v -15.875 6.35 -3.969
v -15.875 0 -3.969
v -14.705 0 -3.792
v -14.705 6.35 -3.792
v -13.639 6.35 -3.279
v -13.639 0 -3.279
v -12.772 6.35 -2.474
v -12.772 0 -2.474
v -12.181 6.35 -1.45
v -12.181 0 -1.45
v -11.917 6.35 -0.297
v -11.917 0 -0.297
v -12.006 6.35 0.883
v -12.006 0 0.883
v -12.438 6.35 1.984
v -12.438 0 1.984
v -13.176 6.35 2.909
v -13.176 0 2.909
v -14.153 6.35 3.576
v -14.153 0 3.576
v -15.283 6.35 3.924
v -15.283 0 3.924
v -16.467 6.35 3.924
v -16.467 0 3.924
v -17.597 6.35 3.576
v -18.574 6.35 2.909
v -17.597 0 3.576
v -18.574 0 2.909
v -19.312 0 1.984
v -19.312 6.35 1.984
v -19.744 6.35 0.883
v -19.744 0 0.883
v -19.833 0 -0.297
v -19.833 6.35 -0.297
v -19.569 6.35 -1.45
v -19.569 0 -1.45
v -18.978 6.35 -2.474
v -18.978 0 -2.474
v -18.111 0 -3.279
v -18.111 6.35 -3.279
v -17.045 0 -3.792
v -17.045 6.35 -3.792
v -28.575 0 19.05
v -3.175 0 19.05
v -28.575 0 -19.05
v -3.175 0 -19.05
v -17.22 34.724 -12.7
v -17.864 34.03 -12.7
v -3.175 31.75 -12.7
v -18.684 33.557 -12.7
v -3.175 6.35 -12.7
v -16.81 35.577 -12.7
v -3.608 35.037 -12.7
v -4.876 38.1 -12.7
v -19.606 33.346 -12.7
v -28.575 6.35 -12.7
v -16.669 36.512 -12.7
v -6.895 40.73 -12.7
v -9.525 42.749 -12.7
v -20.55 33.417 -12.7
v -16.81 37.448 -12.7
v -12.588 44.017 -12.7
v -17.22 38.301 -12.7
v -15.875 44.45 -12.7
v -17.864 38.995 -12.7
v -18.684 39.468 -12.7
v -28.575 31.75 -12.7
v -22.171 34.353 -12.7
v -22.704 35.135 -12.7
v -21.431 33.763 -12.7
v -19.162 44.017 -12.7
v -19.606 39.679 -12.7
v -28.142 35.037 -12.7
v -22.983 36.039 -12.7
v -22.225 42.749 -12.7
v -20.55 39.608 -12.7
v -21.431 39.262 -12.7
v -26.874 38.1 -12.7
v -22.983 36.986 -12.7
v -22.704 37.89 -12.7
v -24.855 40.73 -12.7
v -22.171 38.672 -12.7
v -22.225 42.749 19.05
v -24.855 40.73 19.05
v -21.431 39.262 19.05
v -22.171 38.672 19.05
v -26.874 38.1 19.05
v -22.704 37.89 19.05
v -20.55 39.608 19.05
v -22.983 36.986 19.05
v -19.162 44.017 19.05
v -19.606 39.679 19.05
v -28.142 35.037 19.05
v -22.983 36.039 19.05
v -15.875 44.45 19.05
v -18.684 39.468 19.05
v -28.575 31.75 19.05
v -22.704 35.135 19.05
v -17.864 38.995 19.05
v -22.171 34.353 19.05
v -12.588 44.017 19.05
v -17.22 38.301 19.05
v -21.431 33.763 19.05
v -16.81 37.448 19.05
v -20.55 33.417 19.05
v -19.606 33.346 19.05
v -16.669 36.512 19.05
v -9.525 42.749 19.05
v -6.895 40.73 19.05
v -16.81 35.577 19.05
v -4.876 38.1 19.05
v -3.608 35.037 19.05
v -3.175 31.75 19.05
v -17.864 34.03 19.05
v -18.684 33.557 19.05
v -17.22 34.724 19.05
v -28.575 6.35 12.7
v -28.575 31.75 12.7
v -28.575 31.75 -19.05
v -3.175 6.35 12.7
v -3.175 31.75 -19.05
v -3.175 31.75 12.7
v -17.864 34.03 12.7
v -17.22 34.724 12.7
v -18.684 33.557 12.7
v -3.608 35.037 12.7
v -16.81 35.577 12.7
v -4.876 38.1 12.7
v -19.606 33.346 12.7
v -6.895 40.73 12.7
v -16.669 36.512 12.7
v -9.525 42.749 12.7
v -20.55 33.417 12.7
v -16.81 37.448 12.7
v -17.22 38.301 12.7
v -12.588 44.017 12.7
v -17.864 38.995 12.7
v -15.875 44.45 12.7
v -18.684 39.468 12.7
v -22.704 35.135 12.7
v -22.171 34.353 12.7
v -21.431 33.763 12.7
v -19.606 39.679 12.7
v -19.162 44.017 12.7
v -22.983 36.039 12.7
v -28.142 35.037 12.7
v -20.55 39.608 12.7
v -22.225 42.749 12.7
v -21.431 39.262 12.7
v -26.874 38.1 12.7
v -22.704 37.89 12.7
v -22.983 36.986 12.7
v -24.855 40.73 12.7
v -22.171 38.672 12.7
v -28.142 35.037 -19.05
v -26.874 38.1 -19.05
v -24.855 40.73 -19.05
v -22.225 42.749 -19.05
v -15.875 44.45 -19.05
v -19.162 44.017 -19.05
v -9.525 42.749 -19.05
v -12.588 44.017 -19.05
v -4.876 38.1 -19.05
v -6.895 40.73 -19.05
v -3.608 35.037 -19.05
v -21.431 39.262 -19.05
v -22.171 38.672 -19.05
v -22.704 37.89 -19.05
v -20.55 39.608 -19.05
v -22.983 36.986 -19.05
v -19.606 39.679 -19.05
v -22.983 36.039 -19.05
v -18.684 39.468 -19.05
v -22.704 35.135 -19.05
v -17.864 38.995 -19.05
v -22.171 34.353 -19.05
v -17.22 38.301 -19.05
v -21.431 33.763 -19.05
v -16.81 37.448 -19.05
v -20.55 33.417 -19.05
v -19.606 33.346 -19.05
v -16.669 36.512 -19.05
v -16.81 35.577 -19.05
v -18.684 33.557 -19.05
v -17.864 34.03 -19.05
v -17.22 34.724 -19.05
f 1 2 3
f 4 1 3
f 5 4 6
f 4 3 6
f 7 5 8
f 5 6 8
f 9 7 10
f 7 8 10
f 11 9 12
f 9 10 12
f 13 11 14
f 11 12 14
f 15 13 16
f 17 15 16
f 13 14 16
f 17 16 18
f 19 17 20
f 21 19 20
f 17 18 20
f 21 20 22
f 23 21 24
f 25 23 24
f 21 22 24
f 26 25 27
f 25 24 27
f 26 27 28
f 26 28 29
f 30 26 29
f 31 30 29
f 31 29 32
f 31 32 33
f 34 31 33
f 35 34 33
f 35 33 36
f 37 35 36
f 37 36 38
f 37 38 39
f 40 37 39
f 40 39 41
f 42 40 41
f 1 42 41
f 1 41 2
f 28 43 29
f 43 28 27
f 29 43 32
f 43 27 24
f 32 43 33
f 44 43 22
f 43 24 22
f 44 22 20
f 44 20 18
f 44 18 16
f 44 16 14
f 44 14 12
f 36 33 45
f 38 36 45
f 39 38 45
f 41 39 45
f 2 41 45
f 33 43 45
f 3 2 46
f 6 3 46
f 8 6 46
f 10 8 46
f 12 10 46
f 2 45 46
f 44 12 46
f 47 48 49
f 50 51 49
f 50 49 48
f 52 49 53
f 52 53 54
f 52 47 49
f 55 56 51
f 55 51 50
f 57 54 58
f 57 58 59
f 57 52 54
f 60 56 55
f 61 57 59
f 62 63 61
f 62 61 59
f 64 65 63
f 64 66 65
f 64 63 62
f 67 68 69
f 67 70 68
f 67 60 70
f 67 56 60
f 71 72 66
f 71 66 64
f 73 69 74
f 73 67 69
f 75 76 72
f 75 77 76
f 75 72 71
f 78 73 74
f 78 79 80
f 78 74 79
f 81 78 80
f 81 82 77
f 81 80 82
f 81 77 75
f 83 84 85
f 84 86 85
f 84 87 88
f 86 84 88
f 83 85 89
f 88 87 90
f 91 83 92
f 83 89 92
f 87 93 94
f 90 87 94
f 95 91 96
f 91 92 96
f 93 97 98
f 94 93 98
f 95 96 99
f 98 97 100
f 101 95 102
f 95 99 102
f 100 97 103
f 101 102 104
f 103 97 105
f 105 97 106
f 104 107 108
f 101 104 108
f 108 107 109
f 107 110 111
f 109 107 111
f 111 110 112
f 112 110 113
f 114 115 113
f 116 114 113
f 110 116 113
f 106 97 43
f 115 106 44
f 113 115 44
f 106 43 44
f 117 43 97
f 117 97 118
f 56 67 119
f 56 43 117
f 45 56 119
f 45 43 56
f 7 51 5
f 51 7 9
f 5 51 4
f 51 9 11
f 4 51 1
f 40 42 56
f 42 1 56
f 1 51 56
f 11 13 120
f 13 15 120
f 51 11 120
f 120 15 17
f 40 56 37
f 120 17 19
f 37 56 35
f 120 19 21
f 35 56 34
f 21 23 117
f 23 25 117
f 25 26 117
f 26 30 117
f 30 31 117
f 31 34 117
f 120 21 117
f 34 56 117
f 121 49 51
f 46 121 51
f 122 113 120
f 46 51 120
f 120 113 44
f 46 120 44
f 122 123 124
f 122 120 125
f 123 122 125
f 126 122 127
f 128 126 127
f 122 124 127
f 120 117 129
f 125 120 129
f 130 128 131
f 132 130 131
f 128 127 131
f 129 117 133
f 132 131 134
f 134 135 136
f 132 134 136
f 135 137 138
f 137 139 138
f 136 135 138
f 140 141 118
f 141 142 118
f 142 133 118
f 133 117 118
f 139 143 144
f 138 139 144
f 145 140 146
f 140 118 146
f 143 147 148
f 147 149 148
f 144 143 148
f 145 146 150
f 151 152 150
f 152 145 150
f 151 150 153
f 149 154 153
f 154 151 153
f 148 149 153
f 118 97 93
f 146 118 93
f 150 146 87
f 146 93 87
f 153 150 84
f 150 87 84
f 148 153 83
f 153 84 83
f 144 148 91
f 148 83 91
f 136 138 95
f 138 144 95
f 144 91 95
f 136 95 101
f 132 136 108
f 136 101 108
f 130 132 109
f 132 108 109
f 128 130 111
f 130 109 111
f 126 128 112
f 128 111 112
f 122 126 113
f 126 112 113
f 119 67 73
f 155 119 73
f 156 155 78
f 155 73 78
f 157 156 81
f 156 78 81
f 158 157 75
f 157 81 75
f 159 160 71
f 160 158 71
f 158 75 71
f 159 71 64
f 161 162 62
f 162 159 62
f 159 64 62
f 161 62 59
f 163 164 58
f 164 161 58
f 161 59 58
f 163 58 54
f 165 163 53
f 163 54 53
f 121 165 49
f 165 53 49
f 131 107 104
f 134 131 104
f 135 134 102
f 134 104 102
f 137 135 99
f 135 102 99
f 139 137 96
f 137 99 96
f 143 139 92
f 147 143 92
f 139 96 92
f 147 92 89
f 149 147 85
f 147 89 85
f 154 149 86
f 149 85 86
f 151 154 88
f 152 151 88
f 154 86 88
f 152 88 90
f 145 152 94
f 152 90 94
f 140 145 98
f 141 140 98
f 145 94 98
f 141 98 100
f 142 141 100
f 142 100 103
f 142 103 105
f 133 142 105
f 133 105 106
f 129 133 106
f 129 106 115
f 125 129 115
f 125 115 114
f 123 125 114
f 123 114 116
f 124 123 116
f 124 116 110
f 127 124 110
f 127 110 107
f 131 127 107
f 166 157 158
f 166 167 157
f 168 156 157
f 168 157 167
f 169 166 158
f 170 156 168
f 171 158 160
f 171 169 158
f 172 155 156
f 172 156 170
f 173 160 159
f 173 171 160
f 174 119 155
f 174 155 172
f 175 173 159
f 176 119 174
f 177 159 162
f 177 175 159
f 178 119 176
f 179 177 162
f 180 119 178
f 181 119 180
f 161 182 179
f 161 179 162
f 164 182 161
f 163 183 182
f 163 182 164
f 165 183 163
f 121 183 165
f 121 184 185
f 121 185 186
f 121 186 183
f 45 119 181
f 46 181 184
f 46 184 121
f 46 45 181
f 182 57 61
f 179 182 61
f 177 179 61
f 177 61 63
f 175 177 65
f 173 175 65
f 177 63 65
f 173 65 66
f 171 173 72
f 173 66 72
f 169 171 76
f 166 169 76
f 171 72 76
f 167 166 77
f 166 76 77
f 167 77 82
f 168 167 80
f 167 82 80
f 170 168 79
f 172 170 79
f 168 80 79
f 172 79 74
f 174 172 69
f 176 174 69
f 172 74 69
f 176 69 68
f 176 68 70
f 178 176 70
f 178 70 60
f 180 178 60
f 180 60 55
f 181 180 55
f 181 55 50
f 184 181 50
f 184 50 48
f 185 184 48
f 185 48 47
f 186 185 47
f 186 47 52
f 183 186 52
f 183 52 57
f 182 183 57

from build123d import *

# Parameters (mm, degrees)
SKETCH1_W           = 57.15
SKETCH1_H           = 38.1
BOSS_EXTRUDE1_DEPTH = 50.8
SKETCH4_W           = 25.4
SKETCH4_H           = 44.45
CUT_EXTRUDE2_DEPTH  = 79.801427652
SKETCH2_R           = 3.175
CUT_EXTRUDE1_DEPTH  = 70.633186233
SKETCH5_R           = 3.96875
CUT_EXTRUDE3_DEPTH  = 57.171484091


with BuildPart() as part:
    # Sketch1 → Boss-Extrude1 (new body)
    with BuildSketch(Plane(origin=(0, 0, 0), x_dir=(1, 0, 0), z_dir=(0, 1, 0))):
        Rectangle(SKETCH1_W, SKETCH1_H)
    extrude(amount=BOSS_EXTRUDE1_DEPTH)

    # Sketch4 → Cut-Extrude2 (cut, through all)
    with BuildSketch(Plane.ZY.offset(28.575)):
        with Locations((0, 28.575)):
            Rectangle(SKETCH4_W, SKETCH4_H)
    extrude(amount=-CUT_EXTRUDE2_DEPTH, mode=Mode.SUBTRACT)

    # Sketch2 → Cut-Extrude1 (cut, through all)
    with BuildSketch(Plane.XY.offset(19.05)):
        with BuildLine():
            Line((-3.175, 0), (28.575, 0))
            Line((28.575, 0), (28.575, 50.8))
            Line((28.575, 50.8), (-28.575, 50.8))
            Line((-28.575, 50.8), (-28.575, 31.75))
            ThreePointArc((-28.575, 31.75), (-15.875, 44.45), (-3.175, 31.75))
            Line((-3.175, 31.75), (-3.175, 0))
        make_face()
        with Locations((-19.84375, 36.5125)):
            Circle(SKETCH2_R)
    extrude(amount=-CUT_EXTRUDE1_DEPTH, mode=Mode.SUBTRACT)

    # Sketch5 → Cut-Extrude3 (cut, through all)
    with BuildSketch(Plane.XZ):
        with Locations(Location((-15.875, 0, 0), (0, 0, 270))):
            Circle(SKETCH5_R)
    extrude(amount=-CUT_EXTRUDE3_DEPTH, mode=Mode.SUBTRACT)


solid = part.part
